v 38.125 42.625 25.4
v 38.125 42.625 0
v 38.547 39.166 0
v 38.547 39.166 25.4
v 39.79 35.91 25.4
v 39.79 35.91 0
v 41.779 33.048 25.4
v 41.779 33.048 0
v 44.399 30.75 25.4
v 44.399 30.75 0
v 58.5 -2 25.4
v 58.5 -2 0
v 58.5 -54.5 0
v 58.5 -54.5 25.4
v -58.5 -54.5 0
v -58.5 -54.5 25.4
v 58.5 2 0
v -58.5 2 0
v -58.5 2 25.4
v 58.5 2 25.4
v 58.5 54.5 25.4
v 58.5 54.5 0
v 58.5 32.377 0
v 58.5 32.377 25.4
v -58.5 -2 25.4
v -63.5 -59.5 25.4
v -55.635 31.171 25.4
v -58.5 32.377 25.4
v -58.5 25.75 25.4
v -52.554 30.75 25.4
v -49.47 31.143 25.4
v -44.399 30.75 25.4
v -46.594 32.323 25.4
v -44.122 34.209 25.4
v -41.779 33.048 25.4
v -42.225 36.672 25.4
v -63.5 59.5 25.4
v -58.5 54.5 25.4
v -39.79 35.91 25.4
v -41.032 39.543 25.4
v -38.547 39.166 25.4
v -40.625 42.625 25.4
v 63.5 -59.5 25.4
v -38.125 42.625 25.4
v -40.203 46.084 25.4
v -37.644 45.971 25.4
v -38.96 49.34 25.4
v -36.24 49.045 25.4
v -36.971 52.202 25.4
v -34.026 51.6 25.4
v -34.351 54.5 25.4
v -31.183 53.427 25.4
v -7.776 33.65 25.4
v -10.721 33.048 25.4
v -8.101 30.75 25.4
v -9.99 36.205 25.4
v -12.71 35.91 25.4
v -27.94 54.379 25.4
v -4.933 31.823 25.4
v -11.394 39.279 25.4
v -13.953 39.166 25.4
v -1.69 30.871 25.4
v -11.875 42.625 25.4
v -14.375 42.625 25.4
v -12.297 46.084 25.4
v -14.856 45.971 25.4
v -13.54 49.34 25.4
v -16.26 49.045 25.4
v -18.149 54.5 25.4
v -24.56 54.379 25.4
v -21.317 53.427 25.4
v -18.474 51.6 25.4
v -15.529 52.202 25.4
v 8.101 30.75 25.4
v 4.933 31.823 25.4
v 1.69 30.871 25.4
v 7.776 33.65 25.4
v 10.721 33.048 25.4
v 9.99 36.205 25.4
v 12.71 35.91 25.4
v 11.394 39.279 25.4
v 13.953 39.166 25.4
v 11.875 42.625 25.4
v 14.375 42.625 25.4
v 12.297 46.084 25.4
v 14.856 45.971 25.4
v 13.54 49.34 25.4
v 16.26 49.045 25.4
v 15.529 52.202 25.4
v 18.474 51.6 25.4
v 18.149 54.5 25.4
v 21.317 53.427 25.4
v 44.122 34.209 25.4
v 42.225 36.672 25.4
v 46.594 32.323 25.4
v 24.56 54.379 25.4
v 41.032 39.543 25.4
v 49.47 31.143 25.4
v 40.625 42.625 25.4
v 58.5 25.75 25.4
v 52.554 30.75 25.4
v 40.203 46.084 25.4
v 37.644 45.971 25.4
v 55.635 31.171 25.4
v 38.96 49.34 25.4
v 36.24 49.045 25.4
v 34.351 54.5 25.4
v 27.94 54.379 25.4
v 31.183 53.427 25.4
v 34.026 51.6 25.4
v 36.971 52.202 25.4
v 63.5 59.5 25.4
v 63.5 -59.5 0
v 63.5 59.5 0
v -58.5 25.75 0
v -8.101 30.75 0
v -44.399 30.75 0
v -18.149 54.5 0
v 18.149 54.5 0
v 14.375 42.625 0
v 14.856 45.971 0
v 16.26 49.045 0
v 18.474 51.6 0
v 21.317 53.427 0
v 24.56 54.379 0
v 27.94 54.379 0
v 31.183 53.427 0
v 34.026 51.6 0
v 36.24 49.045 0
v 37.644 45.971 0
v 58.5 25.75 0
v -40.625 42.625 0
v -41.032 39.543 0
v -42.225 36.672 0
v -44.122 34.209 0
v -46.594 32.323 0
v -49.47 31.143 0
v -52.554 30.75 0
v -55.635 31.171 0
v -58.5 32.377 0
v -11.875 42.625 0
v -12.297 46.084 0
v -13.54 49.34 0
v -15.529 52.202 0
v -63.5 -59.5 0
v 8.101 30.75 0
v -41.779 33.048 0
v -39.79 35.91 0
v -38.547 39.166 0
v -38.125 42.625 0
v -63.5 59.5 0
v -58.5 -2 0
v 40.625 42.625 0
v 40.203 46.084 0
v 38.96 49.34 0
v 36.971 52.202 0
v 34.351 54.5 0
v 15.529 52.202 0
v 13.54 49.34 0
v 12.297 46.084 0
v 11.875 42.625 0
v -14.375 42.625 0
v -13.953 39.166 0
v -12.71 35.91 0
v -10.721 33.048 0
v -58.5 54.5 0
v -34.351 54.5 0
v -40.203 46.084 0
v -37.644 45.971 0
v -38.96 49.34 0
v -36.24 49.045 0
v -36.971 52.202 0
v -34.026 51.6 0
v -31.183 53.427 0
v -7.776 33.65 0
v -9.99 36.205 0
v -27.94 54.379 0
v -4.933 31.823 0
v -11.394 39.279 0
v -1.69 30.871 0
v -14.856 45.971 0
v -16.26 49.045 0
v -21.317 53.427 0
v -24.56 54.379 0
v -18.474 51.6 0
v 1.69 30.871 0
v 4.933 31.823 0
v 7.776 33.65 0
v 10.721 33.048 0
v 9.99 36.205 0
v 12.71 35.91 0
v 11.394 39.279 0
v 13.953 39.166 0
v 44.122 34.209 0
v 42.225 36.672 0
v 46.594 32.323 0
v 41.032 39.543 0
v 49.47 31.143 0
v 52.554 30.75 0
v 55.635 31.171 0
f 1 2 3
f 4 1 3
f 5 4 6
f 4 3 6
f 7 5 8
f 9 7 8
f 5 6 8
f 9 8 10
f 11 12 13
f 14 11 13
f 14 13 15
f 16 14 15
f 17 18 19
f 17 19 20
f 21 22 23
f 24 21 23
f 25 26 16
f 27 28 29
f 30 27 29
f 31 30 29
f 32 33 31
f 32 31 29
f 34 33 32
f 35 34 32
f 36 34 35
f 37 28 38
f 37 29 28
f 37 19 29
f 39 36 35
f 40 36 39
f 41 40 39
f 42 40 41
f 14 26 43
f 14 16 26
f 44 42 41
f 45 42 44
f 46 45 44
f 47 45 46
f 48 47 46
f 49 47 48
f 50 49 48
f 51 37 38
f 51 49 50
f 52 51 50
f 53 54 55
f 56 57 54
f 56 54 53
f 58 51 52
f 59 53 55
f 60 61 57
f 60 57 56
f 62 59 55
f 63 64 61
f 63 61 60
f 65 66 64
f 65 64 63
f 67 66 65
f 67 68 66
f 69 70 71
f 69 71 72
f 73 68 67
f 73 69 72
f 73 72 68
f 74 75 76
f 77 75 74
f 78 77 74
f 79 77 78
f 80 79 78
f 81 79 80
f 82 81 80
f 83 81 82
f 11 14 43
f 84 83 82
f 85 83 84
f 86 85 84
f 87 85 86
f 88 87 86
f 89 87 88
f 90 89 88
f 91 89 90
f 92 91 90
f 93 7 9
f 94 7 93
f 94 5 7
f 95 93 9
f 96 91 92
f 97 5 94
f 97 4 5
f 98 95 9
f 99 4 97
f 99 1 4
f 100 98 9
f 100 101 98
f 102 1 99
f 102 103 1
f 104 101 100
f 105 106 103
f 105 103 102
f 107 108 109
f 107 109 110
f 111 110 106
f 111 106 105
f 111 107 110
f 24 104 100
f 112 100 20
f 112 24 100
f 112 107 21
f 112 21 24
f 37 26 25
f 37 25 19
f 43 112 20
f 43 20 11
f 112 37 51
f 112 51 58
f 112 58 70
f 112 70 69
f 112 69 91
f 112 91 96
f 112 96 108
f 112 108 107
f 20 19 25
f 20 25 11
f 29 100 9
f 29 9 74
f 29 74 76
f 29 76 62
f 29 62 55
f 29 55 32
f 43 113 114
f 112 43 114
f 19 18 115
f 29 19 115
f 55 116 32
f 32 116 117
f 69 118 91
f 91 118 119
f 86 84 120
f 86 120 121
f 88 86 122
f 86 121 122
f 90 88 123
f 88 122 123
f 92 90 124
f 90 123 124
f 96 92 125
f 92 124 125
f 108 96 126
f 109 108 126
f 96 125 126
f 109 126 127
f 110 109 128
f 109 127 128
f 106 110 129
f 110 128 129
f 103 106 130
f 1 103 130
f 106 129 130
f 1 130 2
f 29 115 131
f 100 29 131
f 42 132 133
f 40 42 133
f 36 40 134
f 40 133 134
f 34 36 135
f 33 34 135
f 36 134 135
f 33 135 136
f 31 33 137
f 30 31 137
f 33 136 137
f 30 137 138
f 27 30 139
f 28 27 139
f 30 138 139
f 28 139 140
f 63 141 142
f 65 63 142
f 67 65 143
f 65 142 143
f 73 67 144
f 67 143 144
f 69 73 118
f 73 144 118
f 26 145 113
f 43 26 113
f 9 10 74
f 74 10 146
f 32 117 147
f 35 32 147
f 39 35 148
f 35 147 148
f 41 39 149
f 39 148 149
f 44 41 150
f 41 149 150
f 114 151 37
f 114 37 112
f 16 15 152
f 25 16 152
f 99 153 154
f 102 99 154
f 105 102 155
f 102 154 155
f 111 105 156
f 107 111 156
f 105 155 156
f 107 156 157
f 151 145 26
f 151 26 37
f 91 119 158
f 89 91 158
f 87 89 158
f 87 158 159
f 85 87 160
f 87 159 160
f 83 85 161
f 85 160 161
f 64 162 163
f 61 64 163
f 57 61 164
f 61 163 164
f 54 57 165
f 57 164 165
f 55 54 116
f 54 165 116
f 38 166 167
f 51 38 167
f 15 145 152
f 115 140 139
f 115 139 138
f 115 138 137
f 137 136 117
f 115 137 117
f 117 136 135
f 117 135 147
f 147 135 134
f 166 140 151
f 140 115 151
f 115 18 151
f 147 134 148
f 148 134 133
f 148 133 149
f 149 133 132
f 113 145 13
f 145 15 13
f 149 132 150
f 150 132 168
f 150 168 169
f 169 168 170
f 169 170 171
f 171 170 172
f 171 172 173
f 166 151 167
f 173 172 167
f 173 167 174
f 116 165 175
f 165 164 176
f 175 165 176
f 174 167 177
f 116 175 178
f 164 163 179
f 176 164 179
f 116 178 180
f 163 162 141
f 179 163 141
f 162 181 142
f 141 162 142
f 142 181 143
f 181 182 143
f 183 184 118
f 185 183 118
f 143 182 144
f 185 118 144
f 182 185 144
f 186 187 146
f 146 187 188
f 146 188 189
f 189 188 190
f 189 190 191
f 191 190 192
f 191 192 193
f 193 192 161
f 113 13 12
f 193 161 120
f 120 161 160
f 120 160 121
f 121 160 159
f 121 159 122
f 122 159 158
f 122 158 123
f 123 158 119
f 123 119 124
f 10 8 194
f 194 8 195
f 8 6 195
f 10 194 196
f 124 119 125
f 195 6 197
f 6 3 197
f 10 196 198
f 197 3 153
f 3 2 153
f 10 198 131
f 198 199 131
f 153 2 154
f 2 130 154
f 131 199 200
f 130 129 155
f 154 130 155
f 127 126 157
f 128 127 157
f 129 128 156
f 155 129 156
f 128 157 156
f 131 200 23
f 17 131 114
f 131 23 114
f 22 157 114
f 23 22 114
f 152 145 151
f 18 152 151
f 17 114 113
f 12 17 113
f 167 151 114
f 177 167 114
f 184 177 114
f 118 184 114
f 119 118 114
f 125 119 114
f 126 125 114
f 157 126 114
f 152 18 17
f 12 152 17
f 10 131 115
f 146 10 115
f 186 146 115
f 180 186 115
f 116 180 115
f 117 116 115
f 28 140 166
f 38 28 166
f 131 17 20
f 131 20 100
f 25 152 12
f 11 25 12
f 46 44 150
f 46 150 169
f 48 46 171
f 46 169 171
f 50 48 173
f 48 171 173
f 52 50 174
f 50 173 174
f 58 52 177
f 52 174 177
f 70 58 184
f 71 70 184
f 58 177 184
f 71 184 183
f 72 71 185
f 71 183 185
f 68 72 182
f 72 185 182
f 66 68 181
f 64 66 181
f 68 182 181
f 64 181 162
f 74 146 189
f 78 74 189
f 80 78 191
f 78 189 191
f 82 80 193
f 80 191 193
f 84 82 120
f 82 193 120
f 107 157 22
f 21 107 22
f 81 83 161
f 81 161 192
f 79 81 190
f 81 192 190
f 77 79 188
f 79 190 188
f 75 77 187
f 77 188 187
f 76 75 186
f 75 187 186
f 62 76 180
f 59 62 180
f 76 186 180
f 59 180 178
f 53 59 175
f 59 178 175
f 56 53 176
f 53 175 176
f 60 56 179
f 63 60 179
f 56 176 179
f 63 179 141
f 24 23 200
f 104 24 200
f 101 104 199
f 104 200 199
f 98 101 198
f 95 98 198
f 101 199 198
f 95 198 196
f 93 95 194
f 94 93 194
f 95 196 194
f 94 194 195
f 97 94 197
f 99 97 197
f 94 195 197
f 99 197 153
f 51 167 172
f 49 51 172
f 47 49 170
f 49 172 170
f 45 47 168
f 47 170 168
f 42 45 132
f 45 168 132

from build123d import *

# Parameters (mm, degrees)
F0_W     = 127
F0_H     = 119
F0_W_2   = 117
F0_H_2   = 23.75
F1_DEPTH = 25.4


# Not quite as in the source:
# - a feature of the source that left no trace in its solid (it failed there, or was rolled back) is left out


with BuildPart() as f1:
    # F0 (on Top) → F1 (new body)
    with BuildSketch(Plane.XY):
        Rectangle(F0_W, F0_H)
        Polygon((58.5, -54.5), (-58.5, -54.5), (-58.5, -30.75), (-58.5, -28.25), (-58.5, -25.75), (-58.5, -2), (58.5, -2), (58.5, -25.75), (58.5, -28.25), (58.5, -30.75), align=None, mode=Mode.SUBTRACT)
        with BuildLine():
            Line((-58.5, 32.3772868405), (-58.5, 54.5))
            Line((-58.5, 54.5), (-44.399074127, 54.5))
            Line((-44.399074127, 54.5), (-34.350925873, 54.5))
            ThreePointArc((-34.350925873, 54.5), (-38.9600636195, 49.3402742154), (-40.625, 42.625))
            ThreePointArc((-40.625, 42.625), (-46.5938326725, 32.3229219329), (-58.5, 32.3772868405))
        make_face(mode=Mode.SUBTRACT)
        with BuildLine():
            Line((-18.149074127, 30.75), (-44.399074127, 30.75))
            ThreePointArc((-44.399074127, 30.75), (-39.7899363805, 35.9097257846), (-38.125, 42.625))
            ThreePointArc((-38.125, 42.625), (-26.25, 54.5), (-14.375, 42.625))
            ThreePointArc((-14.375, 42.625), (-12.7100636195, 35.9097257846), (-8.100925873, 30.75))
            Line((-8.100925873, 30.75), (-18.149074127, 30.75))
        make_face(mode=Mode.SUBTRACT)
        with Locations((0, 13.875)):
            Rectangle(F0_W_2, F0_H_2, mode=Mode.SUBTRACT)
        with BuildLine():
            ThreePointArc((11.875, 42.625), (0, 30.75), (-11.875, 42.625))
            ThreePointArc((-11.875, 42.625), (-13.5399363805, 49.3402742154), (-18.149074127, 54.5))
            Line((-18.149074127, 54.5), (18.149074127, 54.5))
            ThreePointArc((18.149074127, 54.5), (13.5399363805, 49.3402742154), (11.875, 42.625))
        make_face(mode=Mode.SUBTRACT)
        with BuildLine():
            ThreePointArc((14.375, 42.625), (26.25, 54.5), (38.125, 42.625))
            ThreePointArc((38.125, 42.625), (39.7899363805, 35.9097257846), (44.399074127, 30.75))
            Line((44.399074127, 30.75), (8.100925873, 30.75))
            ThreePointArc((8.100925873, 30.75), (12.7100636195, 35.9097257846), (14.375, 42.625))
        make_face(mode=Mode.SUBTRACT)
        with BuildLine():
            Line((34.350925873, 54.5), (58.5, 54.5))
            Line((58.5, 54.5), (58.5, 32.3772868405))
            ThreePointArc((58.5, 32.3772868405), (46.5938326725, 32.3229219329), (40.625, 42.625))
            ThreePointArc((40.625, 42.625), (38.9600636195, 49.3402742154), (34.350925873, 54.5))
        make_face(mode=Mode.SUBTRACT)
    extrude(amount=F1_DEPTH)


solid = f1.part
